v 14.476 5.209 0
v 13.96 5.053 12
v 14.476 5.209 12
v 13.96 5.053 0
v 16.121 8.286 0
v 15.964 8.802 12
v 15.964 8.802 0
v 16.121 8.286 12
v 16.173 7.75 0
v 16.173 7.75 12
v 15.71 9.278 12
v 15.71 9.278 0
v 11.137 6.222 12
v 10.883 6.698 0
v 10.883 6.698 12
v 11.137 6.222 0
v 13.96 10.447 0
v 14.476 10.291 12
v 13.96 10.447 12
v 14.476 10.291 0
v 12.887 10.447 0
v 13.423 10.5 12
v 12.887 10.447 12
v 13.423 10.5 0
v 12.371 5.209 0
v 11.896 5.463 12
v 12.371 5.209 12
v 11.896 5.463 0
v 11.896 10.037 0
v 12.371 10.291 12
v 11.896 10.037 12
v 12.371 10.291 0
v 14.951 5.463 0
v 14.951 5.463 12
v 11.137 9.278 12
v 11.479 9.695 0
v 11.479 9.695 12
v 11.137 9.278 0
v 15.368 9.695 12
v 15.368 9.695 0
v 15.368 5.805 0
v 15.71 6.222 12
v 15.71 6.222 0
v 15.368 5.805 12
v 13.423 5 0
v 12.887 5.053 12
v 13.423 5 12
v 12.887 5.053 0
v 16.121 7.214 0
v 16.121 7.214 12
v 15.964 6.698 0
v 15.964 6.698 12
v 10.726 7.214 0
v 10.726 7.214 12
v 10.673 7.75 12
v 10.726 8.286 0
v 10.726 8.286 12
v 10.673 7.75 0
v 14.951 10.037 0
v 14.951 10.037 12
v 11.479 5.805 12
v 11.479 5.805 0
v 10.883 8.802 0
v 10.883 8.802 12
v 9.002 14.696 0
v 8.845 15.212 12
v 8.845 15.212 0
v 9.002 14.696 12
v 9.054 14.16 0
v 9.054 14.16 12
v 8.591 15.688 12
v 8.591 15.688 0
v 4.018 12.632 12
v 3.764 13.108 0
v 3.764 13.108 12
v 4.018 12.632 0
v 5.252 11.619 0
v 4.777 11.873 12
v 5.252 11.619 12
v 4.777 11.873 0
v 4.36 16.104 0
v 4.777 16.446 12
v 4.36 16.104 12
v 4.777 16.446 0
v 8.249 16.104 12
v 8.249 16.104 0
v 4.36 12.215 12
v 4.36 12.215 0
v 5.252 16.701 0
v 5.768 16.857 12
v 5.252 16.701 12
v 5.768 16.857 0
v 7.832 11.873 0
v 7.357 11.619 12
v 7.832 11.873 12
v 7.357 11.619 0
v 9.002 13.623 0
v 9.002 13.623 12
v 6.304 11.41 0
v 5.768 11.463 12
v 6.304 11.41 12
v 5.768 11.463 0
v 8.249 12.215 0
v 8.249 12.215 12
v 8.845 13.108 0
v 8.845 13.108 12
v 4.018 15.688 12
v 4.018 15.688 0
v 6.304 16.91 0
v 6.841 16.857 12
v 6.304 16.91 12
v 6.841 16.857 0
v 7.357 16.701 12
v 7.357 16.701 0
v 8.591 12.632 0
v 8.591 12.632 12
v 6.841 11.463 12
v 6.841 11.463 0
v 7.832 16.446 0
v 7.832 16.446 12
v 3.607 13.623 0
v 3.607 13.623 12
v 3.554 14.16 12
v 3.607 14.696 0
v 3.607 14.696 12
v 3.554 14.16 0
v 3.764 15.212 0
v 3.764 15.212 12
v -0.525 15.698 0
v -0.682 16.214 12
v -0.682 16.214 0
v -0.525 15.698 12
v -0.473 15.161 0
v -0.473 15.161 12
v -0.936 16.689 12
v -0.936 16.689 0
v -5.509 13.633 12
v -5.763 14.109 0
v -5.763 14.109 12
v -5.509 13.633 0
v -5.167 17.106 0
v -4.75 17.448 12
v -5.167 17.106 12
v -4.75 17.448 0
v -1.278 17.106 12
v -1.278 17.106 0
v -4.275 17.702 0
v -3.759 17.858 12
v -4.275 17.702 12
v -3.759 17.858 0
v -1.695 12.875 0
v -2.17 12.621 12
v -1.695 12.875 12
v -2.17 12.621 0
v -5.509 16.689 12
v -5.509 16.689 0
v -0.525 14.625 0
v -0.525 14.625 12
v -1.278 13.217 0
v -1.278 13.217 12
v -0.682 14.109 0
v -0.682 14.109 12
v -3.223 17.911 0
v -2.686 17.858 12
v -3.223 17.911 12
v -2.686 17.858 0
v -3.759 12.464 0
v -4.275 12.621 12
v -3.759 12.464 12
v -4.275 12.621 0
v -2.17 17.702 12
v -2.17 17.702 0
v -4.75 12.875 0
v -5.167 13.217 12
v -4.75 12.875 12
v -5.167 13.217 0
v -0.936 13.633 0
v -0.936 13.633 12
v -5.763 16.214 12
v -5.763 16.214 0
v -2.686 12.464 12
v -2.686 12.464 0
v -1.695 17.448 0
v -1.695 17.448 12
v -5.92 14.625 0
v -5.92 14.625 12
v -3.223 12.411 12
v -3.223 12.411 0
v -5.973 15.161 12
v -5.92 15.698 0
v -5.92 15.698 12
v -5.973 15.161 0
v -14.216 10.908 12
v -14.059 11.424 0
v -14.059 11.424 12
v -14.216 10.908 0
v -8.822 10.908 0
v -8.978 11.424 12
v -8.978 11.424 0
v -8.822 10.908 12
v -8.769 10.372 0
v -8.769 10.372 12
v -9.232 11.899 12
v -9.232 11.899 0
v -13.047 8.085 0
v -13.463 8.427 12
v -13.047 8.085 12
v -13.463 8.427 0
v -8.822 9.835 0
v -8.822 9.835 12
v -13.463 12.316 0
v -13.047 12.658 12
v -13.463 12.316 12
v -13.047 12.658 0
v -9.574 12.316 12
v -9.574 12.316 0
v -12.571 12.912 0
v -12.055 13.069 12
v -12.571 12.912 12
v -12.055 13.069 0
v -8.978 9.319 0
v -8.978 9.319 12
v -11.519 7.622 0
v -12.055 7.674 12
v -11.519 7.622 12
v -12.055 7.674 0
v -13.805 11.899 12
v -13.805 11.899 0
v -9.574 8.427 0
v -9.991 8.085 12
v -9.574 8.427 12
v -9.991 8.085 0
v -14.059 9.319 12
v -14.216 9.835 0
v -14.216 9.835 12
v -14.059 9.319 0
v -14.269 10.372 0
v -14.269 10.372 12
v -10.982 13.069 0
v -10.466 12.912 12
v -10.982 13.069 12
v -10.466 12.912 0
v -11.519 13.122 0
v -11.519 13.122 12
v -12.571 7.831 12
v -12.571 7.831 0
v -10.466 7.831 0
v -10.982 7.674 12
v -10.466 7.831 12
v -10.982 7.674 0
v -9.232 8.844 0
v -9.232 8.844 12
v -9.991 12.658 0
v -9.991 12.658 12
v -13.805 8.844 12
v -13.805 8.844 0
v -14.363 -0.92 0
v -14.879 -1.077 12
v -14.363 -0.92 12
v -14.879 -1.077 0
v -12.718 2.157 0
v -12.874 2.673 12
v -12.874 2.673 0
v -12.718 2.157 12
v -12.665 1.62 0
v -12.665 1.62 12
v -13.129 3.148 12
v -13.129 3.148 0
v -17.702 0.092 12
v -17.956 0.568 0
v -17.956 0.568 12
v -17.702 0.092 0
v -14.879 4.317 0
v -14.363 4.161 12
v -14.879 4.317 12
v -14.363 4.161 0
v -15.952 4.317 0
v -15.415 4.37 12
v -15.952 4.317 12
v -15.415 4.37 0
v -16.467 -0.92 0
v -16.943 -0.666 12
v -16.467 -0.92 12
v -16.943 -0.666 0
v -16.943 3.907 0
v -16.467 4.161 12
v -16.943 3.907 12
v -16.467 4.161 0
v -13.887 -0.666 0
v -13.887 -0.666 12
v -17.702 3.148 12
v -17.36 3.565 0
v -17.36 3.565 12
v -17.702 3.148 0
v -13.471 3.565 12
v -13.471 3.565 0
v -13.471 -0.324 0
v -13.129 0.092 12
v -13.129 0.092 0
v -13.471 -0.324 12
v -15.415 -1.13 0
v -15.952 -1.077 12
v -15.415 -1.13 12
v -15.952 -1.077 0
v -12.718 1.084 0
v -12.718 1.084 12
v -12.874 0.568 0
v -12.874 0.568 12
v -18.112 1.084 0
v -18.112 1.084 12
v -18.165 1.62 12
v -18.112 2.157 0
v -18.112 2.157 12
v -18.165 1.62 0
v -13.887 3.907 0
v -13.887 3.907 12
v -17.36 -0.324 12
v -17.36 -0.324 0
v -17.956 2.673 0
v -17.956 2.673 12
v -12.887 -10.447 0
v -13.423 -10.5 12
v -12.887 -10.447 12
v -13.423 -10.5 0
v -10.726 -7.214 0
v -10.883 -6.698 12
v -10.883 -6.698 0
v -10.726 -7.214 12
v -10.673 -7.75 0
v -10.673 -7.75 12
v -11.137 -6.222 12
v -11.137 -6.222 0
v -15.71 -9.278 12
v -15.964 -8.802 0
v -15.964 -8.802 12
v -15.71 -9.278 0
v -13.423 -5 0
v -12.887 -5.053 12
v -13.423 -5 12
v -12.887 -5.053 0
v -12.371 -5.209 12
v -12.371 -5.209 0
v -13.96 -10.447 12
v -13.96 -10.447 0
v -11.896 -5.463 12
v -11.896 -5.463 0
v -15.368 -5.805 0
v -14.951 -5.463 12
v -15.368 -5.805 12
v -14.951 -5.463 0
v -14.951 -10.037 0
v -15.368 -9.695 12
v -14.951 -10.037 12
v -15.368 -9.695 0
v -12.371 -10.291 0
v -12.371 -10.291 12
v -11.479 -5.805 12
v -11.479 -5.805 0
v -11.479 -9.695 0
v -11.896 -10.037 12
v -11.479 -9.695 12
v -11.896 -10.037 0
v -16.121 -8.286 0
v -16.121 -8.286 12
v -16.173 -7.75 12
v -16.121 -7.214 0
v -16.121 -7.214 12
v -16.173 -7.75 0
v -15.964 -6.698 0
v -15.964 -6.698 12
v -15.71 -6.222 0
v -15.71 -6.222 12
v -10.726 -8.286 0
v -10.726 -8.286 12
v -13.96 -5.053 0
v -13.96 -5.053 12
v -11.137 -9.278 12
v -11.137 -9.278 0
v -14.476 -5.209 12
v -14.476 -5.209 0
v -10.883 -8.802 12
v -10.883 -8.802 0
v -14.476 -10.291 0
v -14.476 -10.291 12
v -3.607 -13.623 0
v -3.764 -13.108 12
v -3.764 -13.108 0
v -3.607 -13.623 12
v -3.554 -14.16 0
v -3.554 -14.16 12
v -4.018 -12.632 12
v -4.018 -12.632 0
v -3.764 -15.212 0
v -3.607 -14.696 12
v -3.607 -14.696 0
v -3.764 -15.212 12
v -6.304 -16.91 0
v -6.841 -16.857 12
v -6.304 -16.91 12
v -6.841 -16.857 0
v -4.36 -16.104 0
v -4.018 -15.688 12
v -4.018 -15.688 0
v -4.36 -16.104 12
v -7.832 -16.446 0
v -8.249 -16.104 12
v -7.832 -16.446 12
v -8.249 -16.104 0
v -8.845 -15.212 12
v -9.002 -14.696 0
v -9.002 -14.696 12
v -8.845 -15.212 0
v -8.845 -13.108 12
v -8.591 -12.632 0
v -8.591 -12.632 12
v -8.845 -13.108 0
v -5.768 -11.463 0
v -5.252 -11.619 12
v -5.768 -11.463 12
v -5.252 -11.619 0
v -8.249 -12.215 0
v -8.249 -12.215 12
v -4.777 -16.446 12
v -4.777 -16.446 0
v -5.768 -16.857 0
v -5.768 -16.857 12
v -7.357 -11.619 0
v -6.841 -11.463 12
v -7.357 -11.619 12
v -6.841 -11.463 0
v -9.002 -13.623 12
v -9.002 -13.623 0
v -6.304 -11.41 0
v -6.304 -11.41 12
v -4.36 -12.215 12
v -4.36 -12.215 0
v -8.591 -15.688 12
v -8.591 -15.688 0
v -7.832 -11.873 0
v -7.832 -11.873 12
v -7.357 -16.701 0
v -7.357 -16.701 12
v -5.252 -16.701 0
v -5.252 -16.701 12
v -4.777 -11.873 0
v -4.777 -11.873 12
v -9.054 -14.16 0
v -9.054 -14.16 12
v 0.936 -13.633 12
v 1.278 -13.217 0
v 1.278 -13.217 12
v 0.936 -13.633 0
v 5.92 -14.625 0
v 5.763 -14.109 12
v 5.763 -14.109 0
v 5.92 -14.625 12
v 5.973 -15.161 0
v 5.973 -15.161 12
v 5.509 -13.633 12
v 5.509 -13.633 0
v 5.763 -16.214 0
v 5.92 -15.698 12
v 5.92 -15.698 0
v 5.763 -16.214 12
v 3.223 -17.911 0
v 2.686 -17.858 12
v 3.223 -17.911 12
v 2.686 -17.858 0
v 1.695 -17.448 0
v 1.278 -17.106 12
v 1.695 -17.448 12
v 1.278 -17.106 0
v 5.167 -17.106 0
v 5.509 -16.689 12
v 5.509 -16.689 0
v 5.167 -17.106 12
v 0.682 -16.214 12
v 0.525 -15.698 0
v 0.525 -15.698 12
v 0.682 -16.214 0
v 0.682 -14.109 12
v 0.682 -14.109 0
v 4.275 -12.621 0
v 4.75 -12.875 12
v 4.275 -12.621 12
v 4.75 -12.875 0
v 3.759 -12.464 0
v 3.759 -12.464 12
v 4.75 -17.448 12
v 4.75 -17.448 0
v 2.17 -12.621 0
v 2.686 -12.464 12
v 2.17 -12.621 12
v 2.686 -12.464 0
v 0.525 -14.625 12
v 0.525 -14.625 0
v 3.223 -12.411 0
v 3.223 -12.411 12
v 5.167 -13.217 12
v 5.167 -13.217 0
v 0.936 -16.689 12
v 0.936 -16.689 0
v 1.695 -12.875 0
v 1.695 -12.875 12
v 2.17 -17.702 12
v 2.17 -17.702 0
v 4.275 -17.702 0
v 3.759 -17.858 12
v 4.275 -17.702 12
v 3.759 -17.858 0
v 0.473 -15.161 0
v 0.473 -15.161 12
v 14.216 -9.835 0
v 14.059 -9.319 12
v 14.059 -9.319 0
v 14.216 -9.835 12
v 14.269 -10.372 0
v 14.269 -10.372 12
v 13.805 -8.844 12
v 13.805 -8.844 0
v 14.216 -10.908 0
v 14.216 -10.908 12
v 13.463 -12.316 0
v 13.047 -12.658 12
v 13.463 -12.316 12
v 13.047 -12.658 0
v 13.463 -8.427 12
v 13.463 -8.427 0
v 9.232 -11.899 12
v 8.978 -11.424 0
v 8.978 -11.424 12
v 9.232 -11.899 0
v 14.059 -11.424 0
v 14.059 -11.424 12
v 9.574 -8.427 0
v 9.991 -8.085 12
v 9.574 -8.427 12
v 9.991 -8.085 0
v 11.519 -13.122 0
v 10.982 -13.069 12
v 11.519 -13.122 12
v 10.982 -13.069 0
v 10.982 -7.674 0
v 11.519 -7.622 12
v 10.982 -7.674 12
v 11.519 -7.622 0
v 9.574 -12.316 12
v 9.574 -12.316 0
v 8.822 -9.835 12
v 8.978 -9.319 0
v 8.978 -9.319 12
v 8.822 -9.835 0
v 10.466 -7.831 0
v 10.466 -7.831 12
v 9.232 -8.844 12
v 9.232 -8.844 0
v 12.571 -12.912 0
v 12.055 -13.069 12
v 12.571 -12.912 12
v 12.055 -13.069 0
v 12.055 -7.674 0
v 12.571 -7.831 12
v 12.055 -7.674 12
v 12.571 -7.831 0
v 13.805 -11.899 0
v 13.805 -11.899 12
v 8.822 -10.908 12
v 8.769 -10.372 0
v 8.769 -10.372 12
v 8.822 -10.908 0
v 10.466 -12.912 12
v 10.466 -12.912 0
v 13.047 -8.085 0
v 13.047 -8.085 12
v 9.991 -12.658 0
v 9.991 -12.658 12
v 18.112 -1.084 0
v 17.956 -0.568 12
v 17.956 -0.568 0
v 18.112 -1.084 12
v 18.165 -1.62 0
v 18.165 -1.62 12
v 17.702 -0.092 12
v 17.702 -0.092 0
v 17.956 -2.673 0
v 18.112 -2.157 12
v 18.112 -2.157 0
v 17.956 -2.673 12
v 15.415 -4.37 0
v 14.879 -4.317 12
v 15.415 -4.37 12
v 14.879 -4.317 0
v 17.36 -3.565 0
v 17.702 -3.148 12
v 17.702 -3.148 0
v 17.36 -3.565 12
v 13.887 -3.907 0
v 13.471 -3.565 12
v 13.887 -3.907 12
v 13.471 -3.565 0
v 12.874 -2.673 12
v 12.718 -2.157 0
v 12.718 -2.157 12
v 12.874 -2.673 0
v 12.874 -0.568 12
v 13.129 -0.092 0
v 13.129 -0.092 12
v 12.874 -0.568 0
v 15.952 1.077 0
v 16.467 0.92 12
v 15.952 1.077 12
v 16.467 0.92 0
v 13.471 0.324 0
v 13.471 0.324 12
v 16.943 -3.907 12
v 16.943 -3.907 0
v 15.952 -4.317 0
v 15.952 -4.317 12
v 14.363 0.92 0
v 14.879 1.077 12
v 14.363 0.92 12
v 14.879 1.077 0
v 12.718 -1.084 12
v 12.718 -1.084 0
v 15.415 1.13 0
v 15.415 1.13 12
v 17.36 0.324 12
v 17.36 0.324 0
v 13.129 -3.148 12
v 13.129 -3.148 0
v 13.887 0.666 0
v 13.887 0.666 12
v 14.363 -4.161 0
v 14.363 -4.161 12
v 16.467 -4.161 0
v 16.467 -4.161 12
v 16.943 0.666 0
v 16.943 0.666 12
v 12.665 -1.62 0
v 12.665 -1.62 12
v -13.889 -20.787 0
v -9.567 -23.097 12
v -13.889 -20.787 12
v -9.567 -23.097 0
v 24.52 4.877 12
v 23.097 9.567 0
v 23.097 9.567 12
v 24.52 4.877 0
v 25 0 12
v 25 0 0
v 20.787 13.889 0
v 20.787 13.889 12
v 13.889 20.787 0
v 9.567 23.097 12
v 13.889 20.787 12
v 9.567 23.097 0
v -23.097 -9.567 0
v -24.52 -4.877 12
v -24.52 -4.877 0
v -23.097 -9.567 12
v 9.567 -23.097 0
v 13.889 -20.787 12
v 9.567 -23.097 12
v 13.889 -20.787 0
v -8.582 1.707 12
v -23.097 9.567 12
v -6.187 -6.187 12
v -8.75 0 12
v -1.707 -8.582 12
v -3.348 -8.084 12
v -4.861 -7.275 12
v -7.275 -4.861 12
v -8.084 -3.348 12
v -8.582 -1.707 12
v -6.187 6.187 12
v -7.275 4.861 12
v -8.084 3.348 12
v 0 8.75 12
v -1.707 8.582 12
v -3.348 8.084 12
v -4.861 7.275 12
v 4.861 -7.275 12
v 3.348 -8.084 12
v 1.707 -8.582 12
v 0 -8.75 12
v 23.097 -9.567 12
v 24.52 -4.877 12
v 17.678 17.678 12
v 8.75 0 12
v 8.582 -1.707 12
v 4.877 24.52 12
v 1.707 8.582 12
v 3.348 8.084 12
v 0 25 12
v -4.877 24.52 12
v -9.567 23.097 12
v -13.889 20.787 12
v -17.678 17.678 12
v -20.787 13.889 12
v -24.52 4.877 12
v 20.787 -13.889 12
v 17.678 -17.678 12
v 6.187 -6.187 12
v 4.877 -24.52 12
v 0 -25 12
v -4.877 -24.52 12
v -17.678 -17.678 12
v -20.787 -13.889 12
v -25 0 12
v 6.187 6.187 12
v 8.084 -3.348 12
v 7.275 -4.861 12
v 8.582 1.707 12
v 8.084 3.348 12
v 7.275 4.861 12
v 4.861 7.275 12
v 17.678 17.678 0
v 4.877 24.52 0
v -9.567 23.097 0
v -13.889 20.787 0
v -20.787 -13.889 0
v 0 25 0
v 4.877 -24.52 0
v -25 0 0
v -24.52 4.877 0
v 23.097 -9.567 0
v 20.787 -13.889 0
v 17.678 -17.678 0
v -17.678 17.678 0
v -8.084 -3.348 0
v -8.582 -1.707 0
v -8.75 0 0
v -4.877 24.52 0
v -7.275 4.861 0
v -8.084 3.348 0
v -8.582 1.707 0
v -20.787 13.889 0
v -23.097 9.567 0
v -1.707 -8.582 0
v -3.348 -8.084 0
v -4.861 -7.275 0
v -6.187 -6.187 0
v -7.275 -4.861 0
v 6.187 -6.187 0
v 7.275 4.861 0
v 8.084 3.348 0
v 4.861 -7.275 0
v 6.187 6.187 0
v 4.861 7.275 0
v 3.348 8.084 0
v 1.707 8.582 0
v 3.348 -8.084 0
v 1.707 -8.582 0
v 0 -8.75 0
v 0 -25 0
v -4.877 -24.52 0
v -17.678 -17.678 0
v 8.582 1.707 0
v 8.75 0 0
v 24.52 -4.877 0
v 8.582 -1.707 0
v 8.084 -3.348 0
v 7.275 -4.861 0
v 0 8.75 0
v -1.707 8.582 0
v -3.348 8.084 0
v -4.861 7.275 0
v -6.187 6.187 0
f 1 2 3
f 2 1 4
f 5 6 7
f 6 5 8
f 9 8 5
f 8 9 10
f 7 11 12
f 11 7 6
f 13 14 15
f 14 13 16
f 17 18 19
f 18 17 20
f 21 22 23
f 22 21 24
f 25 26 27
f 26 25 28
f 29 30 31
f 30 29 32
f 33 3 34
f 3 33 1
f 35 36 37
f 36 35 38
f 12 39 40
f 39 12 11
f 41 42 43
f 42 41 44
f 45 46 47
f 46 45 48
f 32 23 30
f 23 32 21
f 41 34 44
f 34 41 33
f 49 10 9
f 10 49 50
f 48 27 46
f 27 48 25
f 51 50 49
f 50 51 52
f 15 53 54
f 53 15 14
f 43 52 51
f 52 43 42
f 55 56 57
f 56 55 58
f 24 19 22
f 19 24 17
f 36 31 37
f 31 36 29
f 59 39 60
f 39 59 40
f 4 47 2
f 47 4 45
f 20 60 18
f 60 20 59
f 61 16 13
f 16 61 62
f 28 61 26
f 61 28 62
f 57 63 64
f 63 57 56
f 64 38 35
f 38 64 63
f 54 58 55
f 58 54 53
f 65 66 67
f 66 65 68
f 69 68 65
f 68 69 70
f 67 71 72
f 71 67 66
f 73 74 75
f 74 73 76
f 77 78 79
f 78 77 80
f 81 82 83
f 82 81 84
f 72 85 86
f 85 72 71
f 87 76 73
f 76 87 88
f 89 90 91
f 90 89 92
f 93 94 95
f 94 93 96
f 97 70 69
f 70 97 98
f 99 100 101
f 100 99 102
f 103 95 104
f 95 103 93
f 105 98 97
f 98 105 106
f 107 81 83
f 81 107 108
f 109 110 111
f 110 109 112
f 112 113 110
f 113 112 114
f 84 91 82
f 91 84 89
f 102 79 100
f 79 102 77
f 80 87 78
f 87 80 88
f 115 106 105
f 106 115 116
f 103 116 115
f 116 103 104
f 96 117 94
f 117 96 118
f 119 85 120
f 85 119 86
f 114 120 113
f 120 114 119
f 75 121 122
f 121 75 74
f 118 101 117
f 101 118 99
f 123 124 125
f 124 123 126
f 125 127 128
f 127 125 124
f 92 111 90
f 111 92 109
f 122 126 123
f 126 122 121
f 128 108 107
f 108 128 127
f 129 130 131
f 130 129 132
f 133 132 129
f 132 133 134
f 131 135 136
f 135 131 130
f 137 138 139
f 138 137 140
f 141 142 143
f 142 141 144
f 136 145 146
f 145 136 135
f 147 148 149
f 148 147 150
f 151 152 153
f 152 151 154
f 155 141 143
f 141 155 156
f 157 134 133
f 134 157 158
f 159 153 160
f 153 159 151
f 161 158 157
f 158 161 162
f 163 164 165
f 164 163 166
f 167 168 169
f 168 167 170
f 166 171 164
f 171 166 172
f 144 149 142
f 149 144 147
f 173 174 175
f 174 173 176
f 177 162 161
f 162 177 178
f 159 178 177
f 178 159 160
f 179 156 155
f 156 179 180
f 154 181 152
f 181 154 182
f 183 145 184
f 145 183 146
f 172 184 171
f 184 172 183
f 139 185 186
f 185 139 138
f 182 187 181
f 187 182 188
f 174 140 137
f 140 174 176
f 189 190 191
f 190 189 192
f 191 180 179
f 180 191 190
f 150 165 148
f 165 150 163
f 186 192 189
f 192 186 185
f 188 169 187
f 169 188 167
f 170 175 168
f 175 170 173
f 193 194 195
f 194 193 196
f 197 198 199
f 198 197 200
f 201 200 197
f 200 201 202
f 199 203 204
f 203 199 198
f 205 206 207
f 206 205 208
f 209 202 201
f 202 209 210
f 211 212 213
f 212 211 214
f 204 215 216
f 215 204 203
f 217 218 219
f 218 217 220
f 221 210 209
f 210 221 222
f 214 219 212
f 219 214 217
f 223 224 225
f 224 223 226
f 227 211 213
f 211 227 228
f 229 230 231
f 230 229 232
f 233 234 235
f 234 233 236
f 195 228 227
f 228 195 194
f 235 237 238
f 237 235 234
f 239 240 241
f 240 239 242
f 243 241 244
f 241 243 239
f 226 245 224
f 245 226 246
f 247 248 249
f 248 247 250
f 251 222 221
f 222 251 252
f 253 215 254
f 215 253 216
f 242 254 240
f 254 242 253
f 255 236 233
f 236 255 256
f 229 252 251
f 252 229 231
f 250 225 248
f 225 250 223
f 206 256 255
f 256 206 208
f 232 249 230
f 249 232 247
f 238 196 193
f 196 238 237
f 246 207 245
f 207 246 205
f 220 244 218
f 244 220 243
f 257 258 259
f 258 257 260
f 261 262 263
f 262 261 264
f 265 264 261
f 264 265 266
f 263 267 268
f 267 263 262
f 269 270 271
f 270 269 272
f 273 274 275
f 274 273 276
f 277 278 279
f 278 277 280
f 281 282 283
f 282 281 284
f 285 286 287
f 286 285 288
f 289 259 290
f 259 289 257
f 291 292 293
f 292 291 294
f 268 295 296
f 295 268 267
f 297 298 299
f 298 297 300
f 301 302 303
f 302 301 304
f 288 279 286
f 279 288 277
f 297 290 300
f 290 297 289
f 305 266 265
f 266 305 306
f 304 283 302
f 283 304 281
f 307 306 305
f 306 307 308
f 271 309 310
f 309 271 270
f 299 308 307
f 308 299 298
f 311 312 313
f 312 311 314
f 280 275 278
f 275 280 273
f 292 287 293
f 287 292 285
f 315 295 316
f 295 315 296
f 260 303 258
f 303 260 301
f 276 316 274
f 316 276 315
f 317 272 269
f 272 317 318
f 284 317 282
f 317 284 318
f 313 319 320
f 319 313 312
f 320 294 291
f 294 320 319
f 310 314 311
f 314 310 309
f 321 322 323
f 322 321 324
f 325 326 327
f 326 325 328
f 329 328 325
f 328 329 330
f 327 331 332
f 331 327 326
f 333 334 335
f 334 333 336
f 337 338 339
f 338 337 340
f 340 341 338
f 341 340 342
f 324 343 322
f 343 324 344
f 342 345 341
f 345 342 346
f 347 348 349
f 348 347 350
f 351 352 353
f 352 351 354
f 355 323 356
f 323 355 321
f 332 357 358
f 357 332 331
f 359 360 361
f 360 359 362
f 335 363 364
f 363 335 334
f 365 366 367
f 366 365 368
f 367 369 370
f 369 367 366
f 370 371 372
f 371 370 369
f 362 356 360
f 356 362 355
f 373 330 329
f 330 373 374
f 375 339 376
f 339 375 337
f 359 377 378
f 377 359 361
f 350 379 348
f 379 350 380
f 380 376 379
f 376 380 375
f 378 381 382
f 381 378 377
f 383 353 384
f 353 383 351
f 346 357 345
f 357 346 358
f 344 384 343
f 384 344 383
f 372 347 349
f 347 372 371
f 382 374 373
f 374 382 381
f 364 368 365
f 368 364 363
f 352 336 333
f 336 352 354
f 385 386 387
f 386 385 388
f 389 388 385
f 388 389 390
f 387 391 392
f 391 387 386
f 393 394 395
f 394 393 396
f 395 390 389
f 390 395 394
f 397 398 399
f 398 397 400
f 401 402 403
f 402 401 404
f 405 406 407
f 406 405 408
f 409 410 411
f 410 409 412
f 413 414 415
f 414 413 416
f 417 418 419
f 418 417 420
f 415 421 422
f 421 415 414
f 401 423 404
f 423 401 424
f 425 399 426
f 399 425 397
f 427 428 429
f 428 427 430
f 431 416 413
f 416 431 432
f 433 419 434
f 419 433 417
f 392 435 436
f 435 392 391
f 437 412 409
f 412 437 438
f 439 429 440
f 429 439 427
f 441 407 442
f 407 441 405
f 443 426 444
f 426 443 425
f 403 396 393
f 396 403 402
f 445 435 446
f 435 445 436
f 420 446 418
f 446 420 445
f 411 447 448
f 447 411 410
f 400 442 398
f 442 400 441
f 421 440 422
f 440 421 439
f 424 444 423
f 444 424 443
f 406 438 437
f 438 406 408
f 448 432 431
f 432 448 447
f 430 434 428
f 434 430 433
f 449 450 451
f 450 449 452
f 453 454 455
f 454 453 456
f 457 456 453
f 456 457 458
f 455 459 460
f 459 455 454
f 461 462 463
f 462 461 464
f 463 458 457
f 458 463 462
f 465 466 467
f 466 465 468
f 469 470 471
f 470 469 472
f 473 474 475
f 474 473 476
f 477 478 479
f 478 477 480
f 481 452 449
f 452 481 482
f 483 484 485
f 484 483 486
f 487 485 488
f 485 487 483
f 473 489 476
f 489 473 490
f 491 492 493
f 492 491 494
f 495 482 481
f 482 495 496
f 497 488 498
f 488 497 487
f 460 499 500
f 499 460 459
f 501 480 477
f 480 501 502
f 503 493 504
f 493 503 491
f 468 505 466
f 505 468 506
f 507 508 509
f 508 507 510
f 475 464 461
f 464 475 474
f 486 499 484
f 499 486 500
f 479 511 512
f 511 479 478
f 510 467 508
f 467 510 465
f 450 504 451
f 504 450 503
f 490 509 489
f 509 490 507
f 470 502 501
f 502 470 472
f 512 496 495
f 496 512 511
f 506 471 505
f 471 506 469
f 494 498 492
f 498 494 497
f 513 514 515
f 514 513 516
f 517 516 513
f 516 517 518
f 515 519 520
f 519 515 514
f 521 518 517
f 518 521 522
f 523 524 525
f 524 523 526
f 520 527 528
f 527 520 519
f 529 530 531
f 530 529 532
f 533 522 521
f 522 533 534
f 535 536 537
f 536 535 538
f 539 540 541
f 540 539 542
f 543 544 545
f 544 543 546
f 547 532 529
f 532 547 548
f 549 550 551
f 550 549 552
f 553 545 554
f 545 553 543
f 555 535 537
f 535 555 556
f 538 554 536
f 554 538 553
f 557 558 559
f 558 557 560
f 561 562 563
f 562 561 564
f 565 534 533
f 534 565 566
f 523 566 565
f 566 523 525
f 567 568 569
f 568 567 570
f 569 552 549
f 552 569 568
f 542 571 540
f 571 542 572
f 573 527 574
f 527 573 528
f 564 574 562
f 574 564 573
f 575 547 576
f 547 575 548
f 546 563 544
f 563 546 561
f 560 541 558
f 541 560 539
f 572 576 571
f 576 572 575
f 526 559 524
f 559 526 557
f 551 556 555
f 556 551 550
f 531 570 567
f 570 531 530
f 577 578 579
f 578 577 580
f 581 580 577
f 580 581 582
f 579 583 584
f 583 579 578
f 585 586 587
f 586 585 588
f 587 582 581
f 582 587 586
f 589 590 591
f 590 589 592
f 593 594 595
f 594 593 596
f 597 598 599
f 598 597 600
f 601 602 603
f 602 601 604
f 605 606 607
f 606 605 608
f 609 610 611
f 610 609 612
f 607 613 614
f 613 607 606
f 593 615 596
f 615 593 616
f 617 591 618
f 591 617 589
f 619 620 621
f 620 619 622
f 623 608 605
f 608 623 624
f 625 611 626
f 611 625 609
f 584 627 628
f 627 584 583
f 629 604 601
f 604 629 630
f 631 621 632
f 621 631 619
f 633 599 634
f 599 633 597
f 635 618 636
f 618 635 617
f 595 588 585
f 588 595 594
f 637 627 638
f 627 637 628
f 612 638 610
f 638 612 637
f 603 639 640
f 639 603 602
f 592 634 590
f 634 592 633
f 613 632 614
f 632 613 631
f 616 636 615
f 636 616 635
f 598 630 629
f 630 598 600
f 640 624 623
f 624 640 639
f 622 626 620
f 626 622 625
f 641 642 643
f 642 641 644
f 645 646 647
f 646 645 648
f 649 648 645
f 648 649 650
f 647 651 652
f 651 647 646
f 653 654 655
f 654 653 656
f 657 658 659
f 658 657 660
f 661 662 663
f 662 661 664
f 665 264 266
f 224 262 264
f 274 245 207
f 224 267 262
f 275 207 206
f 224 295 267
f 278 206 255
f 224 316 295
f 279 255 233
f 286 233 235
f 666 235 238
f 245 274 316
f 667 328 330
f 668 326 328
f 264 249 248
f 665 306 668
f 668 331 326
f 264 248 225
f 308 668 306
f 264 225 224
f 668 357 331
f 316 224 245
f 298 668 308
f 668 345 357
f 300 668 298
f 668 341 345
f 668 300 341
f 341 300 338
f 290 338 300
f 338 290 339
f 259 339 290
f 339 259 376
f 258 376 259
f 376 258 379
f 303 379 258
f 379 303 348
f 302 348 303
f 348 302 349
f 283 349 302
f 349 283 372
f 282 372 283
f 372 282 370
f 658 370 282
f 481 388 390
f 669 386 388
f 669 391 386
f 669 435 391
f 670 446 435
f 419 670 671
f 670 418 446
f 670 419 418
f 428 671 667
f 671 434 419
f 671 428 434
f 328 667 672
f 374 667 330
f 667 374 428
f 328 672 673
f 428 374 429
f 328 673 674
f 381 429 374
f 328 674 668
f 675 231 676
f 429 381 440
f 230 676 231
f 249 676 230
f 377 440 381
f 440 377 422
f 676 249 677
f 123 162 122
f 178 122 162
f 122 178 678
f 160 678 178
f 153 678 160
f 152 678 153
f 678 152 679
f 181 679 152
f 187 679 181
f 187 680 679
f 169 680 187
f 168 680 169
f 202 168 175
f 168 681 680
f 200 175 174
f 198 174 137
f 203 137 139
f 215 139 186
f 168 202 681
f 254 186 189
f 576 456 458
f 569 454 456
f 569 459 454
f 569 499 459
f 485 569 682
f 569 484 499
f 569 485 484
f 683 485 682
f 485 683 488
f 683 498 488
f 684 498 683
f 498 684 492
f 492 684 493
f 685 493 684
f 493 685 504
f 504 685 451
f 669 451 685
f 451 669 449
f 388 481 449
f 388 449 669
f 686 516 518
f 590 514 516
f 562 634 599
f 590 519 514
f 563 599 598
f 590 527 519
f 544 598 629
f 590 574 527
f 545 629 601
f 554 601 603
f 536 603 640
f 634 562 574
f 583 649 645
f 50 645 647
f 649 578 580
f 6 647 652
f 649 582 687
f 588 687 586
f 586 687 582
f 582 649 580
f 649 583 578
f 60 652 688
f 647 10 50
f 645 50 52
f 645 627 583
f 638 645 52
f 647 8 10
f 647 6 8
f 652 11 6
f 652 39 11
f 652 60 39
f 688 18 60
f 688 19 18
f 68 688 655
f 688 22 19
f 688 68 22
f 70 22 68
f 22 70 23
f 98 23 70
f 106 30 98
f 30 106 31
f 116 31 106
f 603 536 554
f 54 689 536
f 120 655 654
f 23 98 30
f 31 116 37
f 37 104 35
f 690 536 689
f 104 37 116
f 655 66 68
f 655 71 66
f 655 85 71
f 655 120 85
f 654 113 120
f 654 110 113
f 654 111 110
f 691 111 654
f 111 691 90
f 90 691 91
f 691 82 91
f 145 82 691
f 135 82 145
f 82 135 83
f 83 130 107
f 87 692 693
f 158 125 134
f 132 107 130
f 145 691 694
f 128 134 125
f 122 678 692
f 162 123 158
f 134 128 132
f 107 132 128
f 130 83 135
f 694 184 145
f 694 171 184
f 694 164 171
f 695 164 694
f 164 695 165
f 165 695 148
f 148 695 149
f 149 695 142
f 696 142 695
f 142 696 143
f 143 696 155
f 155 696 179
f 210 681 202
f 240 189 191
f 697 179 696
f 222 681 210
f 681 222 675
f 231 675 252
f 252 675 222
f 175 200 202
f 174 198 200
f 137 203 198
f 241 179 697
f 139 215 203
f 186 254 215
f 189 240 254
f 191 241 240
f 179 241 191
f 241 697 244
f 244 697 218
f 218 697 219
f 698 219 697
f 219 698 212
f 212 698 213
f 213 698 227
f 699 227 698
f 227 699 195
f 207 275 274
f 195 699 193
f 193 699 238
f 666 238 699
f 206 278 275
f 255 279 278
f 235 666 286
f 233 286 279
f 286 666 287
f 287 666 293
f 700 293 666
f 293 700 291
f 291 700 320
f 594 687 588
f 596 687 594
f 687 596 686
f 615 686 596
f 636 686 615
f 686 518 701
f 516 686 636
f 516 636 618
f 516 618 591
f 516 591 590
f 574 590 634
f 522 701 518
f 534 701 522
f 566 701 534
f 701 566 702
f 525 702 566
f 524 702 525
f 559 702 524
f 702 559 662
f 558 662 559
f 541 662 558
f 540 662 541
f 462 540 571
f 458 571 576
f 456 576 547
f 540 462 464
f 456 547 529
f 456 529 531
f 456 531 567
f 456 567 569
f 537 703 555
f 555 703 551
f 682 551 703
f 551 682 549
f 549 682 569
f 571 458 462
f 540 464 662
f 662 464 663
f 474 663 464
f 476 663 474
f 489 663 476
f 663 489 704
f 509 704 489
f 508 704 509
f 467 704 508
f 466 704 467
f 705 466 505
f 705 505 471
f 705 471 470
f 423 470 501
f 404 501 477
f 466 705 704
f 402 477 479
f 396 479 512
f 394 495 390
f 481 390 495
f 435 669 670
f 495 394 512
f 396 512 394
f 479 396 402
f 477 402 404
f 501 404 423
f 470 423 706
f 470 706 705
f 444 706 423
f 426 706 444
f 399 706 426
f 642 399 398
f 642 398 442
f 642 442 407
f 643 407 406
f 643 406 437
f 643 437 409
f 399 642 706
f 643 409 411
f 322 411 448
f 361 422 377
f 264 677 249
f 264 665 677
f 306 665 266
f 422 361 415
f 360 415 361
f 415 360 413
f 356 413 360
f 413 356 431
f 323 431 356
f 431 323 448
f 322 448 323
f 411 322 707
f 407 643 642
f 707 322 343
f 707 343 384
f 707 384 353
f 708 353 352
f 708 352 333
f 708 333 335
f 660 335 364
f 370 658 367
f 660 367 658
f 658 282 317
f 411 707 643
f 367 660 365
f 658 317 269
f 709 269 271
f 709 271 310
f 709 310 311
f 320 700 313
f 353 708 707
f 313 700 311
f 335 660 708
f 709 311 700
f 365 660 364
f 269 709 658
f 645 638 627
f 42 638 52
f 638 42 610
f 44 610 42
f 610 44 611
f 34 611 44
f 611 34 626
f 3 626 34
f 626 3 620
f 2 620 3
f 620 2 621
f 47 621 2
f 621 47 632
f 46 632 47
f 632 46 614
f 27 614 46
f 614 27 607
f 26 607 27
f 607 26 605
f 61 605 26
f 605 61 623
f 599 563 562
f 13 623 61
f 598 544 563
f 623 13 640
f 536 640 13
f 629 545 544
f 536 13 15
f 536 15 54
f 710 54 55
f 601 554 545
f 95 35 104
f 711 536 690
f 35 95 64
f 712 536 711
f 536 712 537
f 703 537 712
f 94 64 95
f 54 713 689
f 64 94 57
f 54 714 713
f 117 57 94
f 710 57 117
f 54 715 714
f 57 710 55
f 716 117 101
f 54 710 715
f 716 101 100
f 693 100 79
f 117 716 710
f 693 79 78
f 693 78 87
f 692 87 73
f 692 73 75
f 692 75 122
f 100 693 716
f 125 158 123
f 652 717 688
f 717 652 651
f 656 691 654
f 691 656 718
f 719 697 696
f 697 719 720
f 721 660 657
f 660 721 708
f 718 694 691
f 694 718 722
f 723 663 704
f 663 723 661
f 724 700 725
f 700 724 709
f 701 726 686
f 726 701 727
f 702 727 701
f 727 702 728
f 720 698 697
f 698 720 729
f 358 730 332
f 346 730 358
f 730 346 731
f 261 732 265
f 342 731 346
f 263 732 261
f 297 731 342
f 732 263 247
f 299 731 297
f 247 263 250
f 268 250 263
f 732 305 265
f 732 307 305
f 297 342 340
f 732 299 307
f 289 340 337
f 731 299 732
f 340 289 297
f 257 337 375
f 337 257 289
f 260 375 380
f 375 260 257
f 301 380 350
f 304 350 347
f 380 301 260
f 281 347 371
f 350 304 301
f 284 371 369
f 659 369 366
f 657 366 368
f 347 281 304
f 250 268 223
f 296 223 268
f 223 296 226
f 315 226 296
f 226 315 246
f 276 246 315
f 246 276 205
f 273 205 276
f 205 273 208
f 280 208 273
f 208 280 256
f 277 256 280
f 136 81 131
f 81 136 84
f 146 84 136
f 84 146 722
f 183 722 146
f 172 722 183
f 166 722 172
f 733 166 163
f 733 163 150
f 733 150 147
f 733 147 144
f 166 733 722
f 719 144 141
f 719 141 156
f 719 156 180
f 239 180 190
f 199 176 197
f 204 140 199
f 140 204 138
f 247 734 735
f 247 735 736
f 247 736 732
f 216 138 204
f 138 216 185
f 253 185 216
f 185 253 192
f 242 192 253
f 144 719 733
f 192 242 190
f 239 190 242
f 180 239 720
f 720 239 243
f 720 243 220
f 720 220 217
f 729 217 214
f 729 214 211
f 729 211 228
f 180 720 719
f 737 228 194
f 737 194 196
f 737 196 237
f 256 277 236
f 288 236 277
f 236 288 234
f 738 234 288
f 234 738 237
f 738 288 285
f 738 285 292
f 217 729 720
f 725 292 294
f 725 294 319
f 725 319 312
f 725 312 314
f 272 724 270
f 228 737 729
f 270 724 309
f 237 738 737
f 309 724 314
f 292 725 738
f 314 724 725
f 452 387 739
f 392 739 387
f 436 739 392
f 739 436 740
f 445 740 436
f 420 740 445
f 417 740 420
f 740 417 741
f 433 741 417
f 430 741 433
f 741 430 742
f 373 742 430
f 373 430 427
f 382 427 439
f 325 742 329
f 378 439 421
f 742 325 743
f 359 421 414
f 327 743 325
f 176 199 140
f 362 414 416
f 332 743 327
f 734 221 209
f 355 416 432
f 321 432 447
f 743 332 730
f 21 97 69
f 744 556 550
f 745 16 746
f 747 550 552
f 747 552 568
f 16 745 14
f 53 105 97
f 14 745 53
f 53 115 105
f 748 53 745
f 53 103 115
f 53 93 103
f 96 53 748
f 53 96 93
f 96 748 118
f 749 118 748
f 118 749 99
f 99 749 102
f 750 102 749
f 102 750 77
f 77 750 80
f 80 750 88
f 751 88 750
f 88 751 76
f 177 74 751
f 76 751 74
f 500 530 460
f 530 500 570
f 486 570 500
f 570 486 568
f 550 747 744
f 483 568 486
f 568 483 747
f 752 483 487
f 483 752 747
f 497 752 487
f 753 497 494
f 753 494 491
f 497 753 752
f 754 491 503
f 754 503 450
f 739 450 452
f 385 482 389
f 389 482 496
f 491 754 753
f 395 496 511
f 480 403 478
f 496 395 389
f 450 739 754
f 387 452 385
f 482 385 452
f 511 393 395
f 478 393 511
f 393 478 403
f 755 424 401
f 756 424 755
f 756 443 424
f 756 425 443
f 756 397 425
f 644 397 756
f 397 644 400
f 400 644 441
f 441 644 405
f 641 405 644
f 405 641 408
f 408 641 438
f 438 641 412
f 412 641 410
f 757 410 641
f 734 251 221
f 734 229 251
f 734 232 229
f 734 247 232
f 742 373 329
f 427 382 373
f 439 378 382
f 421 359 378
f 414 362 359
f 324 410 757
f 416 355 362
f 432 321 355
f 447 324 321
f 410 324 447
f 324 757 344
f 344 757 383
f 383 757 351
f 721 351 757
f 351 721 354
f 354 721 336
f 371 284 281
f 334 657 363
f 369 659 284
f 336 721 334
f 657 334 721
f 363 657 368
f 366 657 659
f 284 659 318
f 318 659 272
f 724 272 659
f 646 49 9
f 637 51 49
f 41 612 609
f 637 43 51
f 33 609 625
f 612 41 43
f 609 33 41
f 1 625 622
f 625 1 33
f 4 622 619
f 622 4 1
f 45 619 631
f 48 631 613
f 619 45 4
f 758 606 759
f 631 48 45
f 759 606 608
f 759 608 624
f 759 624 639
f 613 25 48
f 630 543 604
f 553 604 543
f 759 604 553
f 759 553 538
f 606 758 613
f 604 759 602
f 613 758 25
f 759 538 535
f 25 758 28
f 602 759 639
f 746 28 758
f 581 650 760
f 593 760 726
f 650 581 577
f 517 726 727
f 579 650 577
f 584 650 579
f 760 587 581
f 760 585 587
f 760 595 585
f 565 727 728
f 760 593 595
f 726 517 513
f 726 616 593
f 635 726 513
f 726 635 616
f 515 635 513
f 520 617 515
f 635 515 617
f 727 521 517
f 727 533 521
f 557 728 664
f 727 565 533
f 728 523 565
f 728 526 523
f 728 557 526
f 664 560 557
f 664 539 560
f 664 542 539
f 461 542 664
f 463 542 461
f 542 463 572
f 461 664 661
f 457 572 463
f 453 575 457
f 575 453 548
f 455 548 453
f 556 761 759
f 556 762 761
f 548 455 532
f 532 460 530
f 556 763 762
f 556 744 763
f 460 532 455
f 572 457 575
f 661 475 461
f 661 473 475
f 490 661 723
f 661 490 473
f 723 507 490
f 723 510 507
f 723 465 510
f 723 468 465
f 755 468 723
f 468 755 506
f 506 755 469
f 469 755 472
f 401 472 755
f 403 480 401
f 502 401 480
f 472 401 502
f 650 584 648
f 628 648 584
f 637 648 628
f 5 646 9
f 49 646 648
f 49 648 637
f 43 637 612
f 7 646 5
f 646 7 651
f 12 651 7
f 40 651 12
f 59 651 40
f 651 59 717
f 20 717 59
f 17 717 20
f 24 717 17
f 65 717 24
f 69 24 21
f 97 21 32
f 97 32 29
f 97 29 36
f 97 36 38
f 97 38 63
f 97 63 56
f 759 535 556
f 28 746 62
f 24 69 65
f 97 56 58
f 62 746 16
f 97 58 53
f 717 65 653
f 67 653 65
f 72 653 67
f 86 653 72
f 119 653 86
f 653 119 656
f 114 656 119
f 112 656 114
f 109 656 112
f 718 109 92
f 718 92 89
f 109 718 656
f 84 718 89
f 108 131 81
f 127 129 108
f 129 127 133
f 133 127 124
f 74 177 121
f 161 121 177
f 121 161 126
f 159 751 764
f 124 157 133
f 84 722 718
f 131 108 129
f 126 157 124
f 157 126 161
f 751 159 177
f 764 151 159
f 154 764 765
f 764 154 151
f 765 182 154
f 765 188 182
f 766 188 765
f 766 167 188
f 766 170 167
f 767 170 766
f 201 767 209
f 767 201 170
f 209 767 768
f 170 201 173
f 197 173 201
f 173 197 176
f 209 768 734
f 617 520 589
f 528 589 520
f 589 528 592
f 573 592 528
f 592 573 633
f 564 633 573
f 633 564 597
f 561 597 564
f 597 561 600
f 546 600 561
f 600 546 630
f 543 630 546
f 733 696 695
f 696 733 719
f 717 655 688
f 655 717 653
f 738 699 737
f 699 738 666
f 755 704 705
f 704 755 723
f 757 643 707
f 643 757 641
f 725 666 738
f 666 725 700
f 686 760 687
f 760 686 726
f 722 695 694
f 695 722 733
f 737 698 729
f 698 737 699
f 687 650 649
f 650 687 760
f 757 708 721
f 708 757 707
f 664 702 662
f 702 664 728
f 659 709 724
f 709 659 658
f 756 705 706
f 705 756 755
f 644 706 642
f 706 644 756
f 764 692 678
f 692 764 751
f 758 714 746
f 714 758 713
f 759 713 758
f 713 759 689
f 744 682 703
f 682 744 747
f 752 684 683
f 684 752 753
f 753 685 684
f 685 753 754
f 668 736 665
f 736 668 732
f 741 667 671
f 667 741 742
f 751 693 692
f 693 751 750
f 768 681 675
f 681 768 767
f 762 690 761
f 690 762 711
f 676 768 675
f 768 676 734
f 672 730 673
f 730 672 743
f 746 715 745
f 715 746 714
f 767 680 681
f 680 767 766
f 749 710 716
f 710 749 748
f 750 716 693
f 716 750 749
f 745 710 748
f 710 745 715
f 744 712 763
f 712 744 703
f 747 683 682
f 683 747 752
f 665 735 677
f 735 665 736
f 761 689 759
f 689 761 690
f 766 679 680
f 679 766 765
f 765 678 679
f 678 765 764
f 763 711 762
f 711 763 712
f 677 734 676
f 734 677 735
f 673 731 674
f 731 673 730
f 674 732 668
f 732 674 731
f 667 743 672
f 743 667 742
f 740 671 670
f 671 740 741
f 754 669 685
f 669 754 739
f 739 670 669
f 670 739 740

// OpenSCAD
$fn = 32;

// ----------------------------------------------------------------------
// Flange Ø50 x 12
// 10 holes on a Ø31 bolt circle, bolted joints
// ----------------------------------------------------------------------

// --- parameters (mm) ---
flange_d = 50;   // outside diameter of the flange
thickness = 12;  // flange thickness
holes = 10;      // number of bolt holes
pcd = 31;        // bolt circle diameter
start_deg = 30;  // angle of the first hole, from +X
hole_d = 5.5;    // bolt hole diameter
bore_d = 17.5;   // central through bore
hub_d = 25.5;    // hub outside diameter
hub_h = 0;       // hub height above the flange face (0 = no hub)

// --- derived feature positions (mm) ---
height = thickness + hub_h;  // = 12   overall height of the part
pcd_r = pcd / 2;             // = 15.5   bolt circle radius
hole_step = 360 / holes;     // = 36   angular pitch
feature_centers = [
  [pcd_r * cos(start_deg + 0 * hole_step), pcd_r * sin(start_deg + 0 * hole_step)],
  [pcd_r * cos(start_deg + 1 * hole_step), pcd_r * sin(start_deg + 1 * hole_step)],
  [pcd_r * cos(start_deg + 2 * hole_step), pcd_r * sin(start_deg + 2 * hole_step)],
  [pcd_r * cos(start_deg + 3 * hole_step), pcd_r * sin(start_deg + 3 * hole_step)],
  [pcd_r * cos(start_deg + 4 * hole_step), pcd_r * sin(start_deg + 4 * hole_step)],
  [pcd_r * cos(start_deg + 5 * hole_step), pcd_r * sin(start_deg + 5 * hole_step)],
  [pcd_r * cos(start_deg + 6 * hole_step), pcd_r * sin(start_deg + 6 * hole_step)],
  [pcd_r * cos(start_deg + 7 * hole_step), pcd_r * sin(start_deg + 7 * hole_step)],
  [pcd_r * cos(start_deg + 8 * hole_step), pcd_r * sin(start_deg + 8 * hole_step)],
  [pcd_r * cos(start_deg + 9 * hole_step), pcd_r * sin(start_deg + 9 * hole_step)]
];   // bolt hole centres on the pitch circle

// flange disc, every hole and the bore cut straight through
difference() {
  union() {
    cylinder(d = flange_d, h = thickness);
  }
  translate([0, 0, -1]) cylinder(d = bore_d, h = height + 2);  // bore, through
  for (centre = feature_centers)
    translate([centre[0], centre[1], -1]) cylinder(d = hole_d, h = thickness + 2);
}
